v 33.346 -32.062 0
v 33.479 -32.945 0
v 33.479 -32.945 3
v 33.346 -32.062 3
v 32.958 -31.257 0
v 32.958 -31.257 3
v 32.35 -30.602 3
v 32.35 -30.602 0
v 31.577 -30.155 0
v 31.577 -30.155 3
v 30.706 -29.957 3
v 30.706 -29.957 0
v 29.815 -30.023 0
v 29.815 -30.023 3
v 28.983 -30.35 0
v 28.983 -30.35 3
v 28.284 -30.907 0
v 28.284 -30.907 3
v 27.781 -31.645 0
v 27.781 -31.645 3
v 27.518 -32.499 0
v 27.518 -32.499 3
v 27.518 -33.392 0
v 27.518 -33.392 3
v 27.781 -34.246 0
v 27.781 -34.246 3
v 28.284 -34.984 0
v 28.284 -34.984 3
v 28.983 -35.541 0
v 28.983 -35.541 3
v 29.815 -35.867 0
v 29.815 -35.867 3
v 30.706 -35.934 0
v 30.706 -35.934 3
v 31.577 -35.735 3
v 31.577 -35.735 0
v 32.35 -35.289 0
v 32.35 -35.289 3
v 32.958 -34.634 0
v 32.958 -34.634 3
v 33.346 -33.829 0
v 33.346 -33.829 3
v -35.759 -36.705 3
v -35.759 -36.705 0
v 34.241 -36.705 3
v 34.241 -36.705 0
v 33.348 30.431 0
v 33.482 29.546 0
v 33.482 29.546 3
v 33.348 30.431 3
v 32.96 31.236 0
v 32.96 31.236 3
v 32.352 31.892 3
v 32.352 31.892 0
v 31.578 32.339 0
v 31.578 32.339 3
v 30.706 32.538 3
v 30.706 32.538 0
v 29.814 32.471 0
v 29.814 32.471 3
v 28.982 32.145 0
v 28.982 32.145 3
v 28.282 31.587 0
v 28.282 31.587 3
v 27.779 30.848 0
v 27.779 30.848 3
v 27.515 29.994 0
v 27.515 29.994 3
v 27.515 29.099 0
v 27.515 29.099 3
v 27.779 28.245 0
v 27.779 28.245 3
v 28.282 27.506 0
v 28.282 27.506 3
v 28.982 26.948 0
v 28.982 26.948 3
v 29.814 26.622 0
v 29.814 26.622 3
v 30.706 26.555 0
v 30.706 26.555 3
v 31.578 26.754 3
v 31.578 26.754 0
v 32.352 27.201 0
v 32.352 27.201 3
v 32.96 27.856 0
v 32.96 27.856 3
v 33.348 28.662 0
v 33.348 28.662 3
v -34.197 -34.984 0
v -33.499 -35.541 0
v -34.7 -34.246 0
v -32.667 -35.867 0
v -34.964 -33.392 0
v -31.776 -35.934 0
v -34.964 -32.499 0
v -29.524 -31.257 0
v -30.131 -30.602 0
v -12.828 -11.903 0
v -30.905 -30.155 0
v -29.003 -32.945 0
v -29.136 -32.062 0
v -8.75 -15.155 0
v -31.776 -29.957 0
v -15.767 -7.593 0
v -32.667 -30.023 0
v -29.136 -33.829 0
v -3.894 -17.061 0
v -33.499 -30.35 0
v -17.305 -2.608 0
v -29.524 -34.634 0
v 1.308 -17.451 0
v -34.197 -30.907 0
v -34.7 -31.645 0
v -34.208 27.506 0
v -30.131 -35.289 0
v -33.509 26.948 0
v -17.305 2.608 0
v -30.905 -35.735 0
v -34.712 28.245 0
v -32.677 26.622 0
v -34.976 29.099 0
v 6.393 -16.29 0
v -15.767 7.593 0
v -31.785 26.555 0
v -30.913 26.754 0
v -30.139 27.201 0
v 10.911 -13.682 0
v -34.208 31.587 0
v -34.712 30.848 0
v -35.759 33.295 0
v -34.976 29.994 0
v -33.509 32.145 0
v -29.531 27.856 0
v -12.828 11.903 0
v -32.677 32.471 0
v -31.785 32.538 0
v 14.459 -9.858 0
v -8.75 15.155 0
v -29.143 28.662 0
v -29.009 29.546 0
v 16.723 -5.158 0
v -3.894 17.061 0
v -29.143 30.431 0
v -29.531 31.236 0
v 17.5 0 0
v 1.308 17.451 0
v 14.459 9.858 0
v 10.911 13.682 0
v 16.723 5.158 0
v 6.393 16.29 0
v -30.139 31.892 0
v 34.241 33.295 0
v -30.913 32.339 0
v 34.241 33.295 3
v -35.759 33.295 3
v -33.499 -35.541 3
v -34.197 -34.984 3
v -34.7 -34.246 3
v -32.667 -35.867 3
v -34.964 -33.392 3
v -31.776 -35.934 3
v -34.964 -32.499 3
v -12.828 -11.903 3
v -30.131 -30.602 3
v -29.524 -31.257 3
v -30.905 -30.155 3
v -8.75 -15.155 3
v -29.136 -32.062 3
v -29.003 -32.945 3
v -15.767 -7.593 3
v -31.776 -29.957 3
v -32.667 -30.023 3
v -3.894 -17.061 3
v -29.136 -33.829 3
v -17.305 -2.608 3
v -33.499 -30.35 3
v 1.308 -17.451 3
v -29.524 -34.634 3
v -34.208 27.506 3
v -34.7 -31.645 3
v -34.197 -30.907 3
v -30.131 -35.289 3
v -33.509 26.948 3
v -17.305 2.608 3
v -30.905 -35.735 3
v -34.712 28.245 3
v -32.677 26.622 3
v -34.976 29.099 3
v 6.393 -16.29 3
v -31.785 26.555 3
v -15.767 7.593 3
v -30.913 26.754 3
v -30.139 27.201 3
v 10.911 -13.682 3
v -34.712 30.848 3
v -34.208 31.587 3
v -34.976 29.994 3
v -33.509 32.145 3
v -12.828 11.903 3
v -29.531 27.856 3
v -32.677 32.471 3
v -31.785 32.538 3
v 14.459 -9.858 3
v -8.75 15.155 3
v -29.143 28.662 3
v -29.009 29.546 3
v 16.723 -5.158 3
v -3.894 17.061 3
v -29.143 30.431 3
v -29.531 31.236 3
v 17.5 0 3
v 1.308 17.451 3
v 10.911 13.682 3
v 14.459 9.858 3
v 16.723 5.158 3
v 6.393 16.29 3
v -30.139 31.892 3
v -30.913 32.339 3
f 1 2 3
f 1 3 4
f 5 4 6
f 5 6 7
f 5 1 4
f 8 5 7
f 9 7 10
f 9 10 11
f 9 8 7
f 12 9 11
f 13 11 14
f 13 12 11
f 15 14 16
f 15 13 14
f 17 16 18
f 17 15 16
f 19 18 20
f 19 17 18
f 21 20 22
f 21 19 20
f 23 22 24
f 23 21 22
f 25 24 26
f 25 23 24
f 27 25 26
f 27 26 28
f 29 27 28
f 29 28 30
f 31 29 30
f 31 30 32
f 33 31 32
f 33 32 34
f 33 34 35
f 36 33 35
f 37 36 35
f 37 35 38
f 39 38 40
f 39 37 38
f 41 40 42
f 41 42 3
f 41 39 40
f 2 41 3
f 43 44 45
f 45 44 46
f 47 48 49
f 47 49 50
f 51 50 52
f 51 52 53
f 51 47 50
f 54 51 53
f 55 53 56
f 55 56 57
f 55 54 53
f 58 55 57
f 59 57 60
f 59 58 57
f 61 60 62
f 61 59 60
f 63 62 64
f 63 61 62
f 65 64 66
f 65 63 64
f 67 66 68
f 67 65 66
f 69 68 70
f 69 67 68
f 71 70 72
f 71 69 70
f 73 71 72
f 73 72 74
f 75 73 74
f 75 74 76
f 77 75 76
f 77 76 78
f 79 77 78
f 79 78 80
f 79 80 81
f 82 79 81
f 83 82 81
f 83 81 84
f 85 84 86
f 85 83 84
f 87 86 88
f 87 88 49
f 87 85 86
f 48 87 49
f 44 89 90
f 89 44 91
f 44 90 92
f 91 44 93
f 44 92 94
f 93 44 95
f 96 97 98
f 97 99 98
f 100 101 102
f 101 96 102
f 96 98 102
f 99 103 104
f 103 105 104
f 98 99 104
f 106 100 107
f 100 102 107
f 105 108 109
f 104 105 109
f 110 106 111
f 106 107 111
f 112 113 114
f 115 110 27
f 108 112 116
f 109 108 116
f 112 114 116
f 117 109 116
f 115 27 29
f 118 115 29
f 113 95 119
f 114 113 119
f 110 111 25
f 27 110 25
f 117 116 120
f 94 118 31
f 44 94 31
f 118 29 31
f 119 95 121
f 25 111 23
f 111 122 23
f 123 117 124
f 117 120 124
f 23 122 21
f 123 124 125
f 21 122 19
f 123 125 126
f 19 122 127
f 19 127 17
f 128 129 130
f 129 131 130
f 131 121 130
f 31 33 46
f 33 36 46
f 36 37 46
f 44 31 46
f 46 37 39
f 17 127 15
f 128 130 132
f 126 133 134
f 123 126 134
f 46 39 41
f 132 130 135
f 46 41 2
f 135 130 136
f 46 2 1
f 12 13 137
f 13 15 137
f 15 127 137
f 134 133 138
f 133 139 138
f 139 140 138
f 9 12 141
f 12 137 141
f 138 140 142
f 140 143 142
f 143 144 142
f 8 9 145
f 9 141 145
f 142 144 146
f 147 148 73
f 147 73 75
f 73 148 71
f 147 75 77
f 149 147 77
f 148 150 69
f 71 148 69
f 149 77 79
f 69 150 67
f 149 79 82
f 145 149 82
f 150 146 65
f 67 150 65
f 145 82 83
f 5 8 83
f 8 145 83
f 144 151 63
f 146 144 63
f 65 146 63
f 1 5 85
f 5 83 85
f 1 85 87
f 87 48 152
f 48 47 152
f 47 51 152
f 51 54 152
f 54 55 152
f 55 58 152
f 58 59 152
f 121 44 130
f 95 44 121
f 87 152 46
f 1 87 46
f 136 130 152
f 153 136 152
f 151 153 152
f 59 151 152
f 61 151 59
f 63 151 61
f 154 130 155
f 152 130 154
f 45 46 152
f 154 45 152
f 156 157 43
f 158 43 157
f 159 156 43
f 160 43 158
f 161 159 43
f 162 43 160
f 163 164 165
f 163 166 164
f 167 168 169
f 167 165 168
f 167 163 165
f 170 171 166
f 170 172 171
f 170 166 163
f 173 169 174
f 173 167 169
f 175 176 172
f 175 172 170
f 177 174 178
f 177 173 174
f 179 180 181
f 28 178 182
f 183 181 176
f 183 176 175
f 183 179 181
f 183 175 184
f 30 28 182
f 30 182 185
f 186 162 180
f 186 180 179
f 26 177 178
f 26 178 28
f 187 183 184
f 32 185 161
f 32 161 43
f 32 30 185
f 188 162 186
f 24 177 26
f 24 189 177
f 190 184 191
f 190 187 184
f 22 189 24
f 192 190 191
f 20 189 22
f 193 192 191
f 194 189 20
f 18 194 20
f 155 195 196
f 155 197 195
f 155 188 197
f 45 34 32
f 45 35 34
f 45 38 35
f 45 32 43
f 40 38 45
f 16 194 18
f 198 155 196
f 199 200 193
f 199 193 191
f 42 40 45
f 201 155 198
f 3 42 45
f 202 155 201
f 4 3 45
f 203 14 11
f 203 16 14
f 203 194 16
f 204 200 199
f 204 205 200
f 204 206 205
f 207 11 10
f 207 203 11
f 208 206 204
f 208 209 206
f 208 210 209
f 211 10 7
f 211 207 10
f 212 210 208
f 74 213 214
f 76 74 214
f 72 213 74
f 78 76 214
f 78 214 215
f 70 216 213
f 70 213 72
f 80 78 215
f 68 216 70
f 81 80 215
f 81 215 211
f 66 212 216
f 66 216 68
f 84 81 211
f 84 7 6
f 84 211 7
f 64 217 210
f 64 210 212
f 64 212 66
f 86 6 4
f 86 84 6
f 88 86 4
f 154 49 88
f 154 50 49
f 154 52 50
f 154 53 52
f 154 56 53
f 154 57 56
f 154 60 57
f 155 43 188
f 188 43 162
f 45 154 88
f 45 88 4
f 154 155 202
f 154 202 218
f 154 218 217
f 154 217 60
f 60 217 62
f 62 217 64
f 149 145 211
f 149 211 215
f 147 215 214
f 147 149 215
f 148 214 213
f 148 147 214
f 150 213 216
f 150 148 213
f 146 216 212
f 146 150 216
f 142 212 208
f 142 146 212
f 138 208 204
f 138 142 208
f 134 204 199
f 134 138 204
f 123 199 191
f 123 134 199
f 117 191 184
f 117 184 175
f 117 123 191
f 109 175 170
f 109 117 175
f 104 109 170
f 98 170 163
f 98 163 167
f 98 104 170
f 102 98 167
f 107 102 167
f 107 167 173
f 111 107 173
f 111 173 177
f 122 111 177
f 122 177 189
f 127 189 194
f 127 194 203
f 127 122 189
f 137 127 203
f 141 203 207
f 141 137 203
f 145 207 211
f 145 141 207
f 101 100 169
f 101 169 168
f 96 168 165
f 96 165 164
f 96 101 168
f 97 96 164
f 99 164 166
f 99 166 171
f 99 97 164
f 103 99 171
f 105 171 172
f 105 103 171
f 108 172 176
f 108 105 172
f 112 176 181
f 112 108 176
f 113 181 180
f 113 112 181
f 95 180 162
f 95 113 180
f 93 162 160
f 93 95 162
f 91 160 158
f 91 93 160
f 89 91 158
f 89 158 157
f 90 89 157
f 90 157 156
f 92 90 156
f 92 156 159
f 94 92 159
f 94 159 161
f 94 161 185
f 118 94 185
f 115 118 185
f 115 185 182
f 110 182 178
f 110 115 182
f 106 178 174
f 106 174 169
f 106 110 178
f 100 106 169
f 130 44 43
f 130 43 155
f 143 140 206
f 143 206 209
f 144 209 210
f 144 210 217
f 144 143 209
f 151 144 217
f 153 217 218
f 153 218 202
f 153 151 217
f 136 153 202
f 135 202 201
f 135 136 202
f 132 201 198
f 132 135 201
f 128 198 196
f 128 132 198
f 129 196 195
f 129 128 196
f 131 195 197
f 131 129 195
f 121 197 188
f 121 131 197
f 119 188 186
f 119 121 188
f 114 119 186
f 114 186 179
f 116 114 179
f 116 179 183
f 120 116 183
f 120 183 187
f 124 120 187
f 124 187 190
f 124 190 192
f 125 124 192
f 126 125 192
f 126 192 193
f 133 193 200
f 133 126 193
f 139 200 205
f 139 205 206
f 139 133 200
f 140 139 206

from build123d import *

# Parameters (mm, degrees)
F0_W     = 70.000038
F0_H     = 70.000037
F0_R     = 2.9972
F0_R_2   = 2.999994
F0_R_3   = 17.500009
F1_DEPTH = 3.000002


with BuildPart() as f1:
    # F0 (on Top) → F1 (new body)
    with BuildSketch(Plane.XY):
        with Locations((-0.759288, -1.704548)):
            Rectangle(F0_W, F0_H)
        with Locations((-32.000107, -32.945367)):
            Circle(F0_R, mode=Mode.SUBTRACT)
        with Locations((30.481531, -32.945367)):
            Circle(F0_R, mode=Mode.SUBTRACT)
        with Locations((-32.009307, 29.54643)):
            Circle(F0_R_2, mode=Mode.SUBTRACT)
        Circle(F0_R_3, mode=Mode.SUBTRACT)
        with Locations((30.481531, 29.54643)):
            Circle(F0_R_2, mode=Mode.SUBTRACT)
    extrude(amount=F1_DEPTH)


solid = f1.part
